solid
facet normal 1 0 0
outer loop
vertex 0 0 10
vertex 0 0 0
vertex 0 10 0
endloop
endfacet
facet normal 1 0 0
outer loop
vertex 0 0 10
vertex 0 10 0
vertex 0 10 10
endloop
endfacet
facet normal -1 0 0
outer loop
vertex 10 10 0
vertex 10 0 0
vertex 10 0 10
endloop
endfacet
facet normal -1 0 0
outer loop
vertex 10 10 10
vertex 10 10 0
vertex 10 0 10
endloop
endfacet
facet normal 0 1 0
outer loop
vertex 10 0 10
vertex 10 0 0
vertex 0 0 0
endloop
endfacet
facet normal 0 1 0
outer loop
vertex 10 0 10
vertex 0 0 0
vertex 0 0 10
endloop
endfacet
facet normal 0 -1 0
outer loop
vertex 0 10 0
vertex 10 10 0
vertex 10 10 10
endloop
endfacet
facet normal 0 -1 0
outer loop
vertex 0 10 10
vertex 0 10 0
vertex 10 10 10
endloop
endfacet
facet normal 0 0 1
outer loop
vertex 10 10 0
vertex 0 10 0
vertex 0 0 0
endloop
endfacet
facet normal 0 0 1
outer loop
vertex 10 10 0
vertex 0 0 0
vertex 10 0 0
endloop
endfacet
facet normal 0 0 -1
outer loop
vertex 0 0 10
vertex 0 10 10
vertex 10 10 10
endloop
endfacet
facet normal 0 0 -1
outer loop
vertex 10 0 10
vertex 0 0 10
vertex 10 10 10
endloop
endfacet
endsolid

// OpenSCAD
face_1_points = [
  [0,10,0],[0,0,0],[0,0,10], // Triangle 1 / 2
  [0,10,10],[0,10,0],[0,0,10],
];
face_1_faces = [
  [0,1,2], // Triangle 1 / 2
  [3,4,5],
];

face_2_points = [
  [10,0,10],[10,0,0],[10,10,0], // Triangle 1 / 2
  [10,0,10],[10,10,0],[10,10,10],
];
face_2_faces = [
  [0,1,2], // Triangle 1 / 2
  [3,4,5],
];

face_3_points = [
  [0,0,0],[10,0,0],[10,0,10], // Triangle 1 / 2
  [0,0,10],[0,0,0],[10,0,10],
];
face_3_faces = [
  [0,1,2], // Triangle 1 / 2
  [3,4,5],
];

face_4_points = [
  [10,10,10],[10,10,0],[0,10,0], // Triangle 1 / 2
  [10,10,10],[0,10,0],[0,10,10],
];
face_4_faces = [
  [0,1,2], // Triangle 1 / 2
  [3,4,5],
];

face_5_points = [
  [0,0,0],[0,10,0],[10,10,0], // Triangle 1 / 2
  [10,0,0],[0,0,0],[10,10,0],
];
face_5_faces = [
  [0,1,2], // Triangle 1 / 2
  [3,4,5],
];

face_6_points = [
  [10,10,10],[0,10,10],[0,0,10], // Triangle 1 / 2
  [10,10,10],[0,0,10],[10,0,10],
];
face_6_faces = [
  [0,1,2], // Triangle 1 / 2
  [3,4,5],
];

module crazy_colors() {
color("Violet")
polyhedron(face_1_points, face_1_faces);
color("red")
polyhedron(face_2_points, face_2_faces);
color("blue")
polyhedron(face_3_points, face_3_faces);
color("LawnGreen")
polyhedron(face_4_points, face_4_faces);
color("Orange")
polyhedron(face_5_points, face_5_faces);
color("DeepPink")
polyhedron(face_6_points, face_6_faces);
}
function add_offset(vec,ofs) = [for (x=vec) x + [ofs,ofs,ofs]];
module solid_object() {
  tmp1_points = face_1_points;
  tmp1_faces =  face_1_faces;

  tmp2_points = concat(tmp1_points, face_2_points);
  tmp2_faces =  concat(tmp1_faces,add_offset(face_2_faces,len(tmp1_points)));

  tmp3_points = concat(tmp2_points, face_3_points);
  tmp3_faces =  concat(tmp2_faces,add_offset(face_3_faces,len(tmp2_points)));

  tmp4_points = concat(tmp3_points, face_4_points);
  tmp4_faces =  concat(tmp3_faces,add_offset(face_4_faces,len(tmp3_points)));

  tmp5_points = concat(tmp4_points, face_5_points);
  tmp5_faces =  concat(tmp4_faces,add_offset(face_5_faces,len(tmp4_points)));

  tmp6_points = concat(tmp5_points, face_6_points);
  tmp6_faces =  concat(tmp5_faces,add_offset(face_6_faces,len(tmp5_points)));

  polyhedron (tmp6_points, tmp6_faces);
}


if ($preview) {;
  crazy_colors();
} else {
  solid_object();
}
